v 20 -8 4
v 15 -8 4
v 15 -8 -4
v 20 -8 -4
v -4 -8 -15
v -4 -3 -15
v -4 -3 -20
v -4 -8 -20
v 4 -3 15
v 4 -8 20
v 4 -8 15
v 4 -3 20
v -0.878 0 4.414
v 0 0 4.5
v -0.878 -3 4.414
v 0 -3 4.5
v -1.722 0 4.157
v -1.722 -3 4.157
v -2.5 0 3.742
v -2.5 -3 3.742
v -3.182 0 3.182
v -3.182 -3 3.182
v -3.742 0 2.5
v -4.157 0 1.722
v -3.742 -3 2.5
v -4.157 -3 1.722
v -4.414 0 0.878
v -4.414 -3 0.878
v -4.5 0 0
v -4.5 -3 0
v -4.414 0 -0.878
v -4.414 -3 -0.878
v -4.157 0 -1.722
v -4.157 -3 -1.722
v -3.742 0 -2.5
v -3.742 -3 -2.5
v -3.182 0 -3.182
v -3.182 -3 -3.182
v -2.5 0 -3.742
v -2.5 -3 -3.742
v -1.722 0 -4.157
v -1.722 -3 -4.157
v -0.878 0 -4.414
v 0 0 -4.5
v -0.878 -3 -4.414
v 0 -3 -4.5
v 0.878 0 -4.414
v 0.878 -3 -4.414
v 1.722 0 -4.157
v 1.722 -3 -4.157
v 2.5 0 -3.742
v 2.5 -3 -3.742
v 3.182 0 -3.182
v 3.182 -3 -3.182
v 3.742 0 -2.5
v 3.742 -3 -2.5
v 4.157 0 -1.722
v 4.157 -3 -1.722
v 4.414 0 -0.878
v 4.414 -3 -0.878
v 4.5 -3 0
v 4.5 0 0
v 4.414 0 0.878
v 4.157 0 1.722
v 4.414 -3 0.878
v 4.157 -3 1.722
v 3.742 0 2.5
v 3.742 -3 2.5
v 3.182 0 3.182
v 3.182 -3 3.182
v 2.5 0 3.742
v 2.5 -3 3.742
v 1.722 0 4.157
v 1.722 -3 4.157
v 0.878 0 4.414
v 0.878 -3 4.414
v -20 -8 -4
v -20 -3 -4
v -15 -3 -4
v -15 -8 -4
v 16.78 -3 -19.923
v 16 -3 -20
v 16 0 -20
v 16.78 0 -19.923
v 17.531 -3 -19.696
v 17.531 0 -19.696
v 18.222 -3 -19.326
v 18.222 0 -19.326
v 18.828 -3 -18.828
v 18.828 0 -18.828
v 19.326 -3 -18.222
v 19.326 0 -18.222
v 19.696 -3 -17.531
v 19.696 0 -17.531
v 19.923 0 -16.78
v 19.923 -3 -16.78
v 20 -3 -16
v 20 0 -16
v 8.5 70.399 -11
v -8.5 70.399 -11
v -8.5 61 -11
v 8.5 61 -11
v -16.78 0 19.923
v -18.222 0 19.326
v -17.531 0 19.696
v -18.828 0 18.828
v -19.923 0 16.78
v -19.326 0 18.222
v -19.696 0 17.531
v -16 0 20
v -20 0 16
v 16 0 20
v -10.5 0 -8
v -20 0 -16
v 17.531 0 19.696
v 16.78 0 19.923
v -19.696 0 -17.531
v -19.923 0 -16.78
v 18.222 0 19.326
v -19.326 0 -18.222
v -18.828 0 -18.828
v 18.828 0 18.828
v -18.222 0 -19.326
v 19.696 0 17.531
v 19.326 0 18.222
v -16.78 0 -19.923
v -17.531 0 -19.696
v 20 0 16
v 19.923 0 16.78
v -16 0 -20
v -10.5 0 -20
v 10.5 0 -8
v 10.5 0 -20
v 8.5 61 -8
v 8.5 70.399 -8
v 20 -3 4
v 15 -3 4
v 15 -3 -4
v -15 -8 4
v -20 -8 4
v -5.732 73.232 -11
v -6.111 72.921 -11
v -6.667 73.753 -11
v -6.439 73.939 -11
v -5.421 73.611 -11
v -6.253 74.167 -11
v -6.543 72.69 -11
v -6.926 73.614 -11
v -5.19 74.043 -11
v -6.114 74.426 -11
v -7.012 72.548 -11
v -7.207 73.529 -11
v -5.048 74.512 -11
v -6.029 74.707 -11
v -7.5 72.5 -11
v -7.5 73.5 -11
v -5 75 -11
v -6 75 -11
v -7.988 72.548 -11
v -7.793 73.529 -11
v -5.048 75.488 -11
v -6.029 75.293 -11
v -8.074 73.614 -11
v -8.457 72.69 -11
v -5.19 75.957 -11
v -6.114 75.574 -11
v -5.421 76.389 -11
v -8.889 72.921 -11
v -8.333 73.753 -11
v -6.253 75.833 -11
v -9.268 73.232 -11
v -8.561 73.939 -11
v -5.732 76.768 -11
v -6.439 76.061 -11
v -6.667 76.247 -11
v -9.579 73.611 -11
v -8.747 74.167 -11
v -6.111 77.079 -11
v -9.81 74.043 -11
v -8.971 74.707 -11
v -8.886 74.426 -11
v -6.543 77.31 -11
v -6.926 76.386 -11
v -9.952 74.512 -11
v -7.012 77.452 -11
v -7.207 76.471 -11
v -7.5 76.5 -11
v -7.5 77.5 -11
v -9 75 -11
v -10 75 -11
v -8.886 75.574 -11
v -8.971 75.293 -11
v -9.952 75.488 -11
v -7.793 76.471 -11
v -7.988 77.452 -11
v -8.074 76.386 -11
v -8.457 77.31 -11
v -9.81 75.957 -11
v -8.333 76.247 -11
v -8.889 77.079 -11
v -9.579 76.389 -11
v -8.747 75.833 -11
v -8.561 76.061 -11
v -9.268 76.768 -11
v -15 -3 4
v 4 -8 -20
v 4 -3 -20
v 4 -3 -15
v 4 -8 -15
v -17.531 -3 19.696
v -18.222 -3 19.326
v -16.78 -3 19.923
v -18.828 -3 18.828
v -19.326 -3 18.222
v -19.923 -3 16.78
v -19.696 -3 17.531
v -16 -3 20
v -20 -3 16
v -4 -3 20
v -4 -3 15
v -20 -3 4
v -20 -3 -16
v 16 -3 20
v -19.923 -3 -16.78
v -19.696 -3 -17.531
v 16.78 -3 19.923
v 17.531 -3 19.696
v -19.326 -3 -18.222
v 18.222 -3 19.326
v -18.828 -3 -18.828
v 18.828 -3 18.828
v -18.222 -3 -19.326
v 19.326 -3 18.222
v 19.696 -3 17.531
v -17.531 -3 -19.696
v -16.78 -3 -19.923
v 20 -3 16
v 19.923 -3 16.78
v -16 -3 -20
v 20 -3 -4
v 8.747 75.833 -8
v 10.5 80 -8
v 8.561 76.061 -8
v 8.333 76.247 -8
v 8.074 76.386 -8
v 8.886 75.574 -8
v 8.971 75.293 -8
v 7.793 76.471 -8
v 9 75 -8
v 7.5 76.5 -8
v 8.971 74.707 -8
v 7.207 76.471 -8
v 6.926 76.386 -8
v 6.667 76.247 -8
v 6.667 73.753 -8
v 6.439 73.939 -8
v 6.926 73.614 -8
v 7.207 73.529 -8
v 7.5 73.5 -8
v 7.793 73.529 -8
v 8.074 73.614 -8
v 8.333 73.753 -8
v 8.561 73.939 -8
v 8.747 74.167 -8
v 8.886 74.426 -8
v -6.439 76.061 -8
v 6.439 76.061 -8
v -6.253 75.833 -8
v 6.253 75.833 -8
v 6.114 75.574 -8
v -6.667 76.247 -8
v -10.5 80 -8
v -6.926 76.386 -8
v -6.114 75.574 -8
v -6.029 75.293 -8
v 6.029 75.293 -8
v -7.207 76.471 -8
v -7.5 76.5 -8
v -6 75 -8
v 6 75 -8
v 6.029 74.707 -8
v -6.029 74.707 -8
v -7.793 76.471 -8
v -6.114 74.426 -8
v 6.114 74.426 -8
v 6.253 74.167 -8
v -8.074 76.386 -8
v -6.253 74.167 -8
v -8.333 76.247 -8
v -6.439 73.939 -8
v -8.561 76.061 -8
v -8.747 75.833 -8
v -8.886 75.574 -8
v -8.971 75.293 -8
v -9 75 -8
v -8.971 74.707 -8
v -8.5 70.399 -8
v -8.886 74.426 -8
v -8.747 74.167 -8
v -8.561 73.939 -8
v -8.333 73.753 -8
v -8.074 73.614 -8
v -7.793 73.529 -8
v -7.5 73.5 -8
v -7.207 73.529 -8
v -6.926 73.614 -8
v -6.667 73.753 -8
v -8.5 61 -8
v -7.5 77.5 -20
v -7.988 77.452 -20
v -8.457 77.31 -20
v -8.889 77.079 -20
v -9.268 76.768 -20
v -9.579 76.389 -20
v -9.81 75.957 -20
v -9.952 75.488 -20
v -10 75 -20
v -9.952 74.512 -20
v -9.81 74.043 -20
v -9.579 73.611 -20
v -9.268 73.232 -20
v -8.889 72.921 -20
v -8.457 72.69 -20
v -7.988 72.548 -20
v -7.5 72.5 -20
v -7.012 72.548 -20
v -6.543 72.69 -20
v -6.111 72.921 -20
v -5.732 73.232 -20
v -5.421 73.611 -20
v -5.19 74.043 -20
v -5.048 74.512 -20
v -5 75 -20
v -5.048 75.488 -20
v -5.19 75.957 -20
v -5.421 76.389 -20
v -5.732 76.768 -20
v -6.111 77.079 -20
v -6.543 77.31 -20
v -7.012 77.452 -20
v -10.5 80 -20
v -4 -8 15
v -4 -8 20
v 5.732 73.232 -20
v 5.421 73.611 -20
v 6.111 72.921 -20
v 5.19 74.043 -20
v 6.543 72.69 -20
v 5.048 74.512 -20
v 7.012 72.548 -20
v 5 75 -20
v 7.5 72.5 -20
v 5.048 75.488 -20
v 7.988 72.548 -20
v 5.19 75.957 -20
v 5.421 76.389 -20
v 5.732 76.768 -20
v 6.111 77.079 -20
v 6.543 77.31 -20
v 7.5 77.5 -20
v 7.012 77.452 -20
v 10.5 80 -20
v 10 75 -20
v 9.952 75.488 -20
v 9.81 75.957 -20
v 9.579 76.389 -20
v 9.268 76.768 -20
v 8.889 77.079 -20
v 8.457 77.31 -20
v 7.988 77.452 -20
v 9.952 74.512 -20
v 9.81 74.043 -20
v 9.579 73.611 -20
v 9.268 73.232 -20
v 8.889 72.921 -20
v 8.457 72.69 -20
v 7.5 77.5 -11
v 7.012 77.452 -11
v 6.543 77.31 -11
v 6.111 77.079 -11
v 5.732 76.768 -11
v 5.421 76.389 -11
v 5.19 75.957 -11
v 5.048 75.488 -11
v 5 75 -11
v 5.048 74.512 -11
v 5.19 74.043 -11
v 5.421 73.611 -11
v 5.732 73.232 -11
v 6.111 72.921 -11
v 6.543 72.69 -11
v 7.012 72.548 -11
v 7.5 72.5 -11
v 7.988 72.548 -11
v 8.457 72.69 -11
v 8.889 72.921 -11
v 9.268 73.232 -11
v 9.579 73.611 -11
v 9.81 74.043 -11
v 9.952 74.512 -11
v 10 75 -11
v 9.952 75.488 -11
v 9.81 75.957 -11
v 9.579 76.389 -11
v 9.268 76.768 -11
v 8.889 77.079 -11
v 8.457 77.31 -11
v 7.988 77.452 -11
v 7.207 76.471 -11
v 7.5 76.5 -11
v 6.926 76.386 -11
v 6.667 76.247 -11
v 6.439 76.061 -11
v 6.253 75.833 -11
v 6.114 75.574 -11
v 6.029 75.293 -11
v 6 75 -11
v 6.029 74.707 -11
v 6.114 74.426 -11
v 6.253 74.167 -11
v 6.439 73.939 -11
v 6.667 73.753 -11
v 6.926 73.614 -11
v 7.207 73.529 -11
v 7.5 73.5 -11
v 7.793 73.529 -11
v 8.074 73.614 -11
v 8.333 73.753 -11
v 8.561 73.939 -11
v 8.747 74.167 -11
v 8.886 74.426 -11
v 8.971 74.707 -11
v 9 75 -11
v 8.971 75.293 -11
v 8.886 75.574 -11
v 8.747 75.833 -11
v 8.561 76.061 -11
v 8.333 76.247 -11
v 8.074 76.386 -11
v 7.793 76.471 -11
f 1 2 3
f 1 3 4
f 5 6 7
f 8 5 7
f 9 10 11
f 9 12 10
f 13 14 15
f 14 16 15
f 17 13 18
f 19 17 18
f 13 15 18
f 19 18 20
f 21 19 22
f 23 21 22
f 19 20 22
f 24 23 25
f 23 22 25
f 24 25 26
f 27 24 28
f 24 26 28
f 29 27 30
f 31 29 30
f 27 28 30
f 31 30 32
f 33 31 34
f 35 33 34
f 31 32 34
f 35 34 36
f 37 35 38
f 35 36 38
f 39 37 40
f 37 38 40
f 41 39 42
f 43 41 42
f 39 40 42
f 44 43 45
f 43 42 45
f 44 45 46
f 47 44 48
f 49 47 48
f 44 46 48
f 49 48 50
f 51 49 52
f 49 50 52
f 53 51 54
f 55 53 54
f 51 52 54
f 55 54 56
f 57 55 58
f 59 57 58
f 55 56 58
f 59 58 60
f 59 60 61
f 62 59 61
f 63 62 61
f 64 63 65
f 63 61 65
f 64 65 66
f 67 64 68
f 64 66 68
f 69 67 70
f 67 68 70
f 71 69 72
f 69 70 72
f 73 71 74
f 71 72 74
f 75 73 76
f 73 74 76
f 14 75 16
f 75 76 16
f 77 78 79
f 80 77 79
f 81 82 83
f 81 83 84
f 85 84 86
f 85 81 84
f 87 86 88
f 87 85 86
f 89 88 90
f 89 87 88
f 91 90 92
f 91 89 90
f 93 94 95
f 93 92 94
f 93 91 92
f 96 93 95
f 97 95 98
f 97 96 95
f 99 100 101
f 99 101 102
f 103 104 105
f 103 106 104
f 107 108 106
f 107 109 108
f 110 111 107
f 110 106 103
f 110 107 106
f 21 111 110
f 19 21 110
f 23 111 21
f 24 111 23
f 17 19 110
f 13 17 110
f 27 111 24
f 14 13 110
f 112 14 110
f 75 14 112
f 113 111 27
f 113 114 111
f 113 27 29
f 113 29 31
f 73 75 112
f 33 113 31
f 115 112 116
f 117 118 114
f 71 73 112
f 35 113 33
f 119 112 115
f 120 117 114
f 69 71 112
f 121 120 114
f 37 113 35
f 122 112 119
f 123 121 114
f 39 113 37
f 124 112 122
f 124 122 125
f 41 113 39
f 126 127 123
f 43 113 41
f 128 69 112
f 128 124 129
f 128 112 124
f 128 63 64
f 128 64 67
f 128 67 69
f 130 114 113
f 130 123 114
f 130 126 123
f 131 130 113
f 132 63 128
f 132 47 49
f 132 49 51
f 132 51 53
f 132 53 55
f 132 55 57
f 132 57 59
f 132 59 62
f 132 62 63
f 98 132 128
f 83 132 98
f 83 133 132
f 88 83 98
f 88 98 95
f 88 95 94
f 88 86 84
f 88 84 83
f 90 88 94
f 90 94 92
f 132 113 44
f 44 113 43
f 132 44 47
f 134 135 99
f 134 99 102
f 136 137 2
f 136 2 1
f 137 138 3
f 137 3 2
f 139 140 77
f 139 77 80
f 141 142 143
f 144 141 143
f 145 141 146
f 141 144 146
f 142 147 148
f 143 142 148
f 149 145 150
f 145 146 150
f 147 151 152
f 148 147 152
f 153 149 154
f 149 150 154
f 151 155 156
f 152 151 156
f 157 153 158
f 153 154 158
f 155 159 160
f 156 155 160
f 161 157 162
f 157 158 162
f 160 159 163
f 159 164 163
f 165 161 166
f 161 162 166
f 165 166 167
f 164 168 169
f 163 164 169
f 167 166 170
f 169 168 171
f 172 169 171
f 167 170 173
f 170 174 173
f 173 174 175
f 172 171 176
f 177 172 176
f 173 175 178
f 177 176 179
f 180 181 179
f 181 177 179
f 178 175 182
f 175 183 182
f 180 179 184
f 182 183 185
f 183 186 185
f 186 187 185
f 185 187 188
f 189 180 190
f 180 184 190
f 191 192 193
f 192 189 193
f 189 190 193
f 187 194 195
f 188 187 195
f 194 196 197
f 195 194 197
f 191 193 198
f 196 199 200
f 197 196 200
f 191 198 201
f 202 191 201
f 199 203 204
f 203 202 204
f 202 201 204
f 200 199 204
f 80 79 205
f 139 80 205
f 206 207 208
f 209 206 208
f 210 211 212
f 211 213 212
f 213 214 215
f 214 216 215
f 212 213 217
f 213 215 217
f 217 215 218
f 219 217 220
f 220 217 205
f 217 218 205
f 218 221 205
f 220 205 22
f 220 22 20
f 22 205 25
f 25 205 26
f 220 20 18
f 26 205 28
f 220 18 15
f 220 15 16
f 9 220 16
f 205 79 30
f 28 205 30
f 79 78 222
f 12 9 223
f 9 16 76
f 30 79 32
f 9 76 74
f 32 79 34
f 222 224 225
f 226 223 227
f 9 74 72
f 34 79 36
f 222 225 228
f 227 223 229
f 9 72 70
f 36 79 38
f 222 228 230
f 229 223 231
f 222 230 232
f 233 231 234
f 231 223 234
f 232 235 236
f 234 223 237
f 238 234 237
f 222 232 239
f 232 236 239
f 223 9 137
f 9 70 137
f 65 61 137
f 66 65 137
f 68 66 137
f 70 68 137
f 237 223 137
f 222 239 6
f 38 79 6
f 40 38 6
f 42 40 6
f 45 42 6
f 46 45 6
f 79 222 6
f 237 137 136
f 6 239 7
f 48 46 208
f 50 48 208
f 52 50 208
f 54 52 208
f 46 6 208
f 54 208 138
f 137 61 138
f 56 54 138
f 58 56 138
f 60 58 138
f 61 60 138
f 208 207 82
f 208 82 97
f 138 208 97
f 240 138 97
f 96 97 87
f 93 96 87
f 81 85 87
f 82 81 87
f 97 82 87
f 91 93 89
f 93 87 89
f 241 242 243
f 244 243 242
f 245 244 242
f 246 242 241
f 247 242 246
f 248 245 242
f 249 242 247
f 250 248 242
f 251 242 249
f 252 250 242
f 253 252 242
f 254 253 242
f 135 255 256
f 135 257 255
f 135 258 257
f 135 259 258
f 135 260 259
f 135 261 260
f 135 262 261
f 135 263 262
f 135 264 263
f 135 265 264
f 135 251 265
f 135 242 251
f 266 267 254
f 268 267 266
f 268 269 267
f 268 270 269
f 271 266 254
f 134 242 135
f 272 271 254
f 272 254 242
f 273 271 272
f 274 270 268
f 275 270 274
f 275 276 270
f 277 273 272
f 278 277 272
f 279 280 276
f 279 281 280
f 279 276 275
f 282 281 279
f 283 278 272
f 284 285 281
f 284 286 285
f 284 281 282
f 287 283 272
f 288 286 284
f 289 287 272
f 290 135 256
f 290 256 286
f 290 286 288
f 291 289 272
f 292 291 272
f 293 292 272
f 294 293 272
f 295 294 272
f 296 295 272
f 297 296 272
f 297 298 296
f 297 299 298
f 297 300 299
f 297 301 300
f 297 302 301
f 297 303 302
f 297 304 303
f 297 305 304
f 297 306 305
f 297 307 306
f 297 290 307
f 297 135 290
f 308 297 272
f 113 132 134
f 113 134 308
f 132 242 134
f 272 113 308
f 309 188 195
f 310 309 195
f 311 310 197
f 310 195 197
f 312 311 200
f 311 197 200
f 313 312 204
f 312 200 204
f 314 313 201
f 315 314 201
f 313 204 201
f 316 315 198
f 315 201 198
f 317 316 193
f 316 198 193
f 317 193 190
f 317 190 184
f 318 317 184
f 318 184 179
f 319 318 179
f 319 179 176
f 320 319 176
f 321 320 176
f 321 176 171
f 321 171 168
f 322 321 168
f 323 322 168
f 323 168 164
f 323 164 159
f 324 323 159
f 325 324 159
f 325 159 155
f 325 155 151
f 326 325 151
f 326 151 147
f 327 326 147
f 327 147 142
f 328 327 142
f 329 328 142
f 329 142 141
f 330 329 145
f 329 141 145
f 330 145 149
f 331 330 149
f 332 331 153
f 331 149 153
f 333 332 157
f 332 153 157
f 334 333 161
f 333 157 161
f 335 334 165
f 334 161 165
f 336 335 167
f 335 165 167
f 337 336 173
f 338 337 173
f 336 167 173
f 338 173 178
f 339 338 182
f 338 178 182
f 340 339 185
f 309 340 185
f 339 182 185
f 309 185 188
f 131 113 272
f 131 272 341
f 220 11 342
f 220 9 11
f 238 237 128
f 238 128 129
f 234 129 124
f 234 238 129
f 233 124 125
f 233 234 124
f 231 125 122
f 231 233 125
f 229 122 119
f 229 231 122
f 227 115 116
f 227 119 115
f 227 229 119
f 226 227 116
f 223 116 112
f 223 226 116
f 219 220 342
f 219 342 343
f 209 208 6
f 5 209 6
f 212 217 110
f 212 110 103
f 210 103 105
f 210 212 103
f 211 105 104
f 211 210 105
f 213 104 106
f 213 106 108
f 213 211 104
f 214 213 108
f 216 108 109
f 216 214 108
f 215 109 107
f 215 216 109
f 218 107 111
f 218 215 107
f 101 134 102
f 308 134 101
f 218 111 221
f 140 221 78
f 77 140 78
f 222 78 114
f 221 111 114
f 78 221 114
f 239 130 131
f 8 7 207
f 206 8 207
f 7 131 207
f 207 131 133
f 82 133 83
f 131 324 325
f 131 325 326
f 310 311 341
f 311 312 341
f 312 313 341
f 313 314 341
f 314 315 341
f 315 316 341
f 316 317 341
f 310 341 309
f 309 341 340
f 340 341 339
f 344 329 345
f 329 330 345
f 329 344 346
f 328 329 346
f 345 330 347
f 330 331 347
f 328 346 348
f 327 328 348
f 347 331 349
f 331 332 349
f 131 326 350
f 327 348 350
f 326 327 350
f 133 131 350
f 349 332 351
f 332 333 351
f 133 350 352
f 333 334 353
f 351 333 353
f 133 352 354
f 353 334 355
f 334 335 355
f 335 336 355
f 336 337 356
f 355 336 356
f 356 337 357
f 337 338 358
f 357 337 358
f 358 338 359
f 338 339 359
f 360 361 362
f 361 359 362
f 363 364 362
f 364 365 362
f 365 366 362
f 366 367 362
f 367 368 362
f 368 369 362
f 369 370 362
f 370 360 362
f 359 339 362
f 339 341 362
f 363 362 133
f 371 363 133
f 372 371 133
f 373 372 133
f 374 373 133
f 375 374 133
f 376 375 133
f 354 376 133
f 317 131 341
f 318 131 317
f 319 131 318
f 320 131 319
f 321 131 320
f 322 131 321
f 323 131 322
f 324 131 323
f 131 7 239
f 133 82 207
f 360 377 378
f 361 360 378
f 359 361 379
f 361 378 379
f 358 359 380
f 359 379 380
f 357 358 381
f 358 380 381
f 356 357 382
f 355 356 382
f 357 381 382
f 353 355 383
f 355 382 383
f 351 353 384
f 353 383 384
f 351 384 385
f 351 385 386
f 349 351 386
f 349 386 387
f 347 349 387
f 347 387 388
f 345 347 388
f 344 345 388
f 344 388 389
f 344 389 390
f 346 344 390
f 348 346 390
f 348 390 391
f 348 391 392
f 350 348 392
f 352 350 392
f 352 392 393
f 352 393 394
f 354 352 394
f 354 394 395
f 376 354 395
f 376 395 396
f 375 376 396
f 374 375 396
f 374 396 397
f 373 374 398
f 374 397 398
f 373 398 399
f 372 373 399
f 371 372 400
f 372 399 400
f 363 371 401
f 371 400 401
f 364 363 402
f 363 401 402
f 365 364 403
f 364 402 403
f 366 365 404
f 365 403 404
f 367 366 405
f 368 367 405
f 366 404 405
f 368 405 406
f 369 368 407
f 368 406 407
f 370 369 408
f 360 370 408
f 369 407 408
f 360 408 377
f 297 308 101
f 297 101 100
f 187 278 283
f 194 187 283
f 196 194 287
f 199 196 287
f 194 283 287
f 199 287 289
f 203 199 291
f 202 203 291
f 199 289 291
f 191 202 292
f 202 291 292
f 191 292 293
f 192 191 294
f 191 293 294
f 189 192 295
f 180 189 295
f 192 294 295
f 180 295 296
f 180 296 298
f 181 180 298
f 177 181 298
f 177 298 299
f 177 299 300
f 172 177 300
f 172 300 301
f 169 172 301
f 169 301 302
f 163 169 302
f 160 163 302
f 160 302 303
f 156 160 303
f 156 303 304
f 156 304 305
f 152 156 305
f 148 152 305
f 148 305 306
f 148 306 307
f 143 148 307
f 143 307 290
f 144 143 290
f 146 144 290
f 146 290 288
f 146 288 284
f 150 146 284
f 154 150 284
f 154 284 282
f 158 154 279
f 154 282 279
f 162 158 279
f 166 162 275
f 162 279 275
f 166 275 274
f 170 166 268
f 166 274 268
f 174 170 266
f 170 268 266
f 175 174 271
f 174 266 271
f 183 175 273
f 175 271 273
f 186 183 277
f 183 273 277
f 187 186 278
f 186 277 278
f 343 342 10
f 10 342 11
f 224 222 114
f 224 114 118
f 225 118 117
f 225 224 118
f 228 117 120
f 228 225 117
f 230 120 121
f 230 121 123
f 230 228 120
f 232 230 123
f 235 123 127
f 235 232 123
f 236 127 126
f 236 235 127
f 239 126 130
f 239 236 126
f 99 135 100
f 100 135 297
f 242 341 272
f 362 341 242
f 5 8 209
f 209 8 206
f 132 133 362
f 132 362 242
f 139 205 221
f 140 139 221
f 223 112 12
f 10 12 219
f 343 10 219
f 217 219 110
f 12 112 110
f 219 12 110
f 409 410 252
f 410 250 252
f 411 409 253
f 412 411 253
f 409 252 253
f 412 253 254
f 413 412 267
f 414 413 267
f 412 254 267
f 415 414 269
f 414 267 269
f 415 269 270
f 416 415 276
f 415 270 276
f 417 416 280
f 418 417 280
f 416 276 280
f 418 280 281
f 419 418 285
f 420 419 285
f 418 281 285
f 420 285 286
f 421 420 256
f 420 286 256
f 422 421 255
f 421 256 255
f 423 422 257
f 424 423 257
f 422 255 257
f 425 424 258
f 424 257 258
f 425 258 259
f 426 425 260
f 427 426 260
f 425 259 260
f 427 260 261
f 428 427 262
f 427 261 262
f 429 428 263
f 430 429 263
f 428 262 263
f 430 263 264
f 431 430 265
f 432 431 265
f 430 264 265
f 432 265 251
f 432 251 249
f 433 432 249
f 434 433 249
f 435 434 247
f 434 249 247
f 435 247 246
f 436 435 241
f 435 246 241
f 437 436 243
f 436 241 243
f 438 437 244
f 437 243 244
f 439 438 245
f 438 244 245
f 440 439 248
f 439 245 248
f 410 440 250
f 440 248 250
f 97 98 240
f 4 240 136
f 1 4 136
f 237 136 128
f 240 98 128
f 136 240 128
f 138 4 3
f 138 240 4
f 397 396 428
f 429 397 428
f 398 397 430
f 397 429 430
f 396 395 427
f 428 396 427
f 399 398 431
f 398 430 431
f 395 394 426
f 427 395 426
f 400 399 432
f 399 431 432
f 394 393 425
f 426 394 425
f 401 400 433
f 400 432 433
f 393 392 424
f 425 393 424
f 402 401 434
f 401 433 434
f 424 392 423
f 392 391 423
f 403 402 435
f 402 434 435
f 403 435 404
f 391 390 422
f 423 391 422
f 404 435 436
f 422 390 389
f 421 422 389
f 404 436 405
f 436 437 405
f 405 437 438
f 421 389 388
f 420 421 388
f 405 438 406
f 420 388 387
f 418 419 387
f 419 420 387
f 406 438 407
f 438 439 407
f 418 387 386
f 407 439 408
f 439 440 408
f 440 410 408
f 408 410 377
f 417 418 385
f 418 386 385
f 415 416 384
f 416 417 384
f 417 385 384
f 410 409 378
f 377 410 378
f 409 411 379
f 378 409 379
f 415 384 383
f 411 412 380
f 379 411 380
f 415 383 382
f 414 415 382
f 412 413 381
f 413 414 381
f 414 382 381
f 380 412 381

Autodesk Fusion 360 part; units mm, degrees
sketch "Sketch1" plane through (0, 0, 0) normal (0, 1, 0) x (1, 0, 0)
  line L0 (20, -20) -> (-20, -20)
  line L1 (-20, -20) -> (-20, 20)
  line L2 (-20, 20) -> (20, 20)
  line L3 (20, 20) -> (20, -20)
  line L4 (20, -20) -> (-20, 20) construction
  line L5 (-20, -20) -> (20, 20) construction
  line L6 (-20, 4) -> (-15, 4)
  line L7 (-15, 4) -> (-15, -4)
  line L8 (-15, -4) -> (-20, -4)
  line L9 (-20, -4) -> (-20, 4)
  line L10 (-4, 20) -> (4, 20)
  line L11 (4, 20) -> (4, 15)
  line L12 (4, 15) -> (-4, 15)
  line L13 (-4, 15) -> (-4, 20)
  line L14 (20, 4) -> (15, 4)
  line L15 (15, 4) -> (15, -4)
  line L16 (15, -4) -> (20, -4)
  line L17 (20, -4) -> (20, 4)
  line L18 (-4, -20) -> (4, -20)
  line L19 (4, -20) -> (4, -15)
  line L20 (4, -15) -> (-4, -15)
  line L21 (-4, -15) -> (-4, -20)
  dimension "d1" = 40
  dimension "d2" = 40
  dimension "d3" = 5
  dimension "d4" = 8
  dimension "d5" = 16
  dimension "d6" = 5
  dimension "d7" = 16
  dimension "d8" = 8
  dimension "d9" = 5
  dimension "d10" = 5
  dimension "d11" = 8
  dimension "d12" = 8
  dimension "d13" = 16
  dimension "d14" = 16
extrude "Extrude1" add sketch "Sketch1" against normal blind 3 contours L0 L1 L2 L3 L6 L7 L8 L11 L12 L13 L14 L15 L16 L19 L20 L21
extrude "Extrude2" add sketch "Sketch1" against normal blind 8 contours L0 L18 L19 L20 L21 | L3 L14 L15 L16 L17 | L1 L6 L7 L8 L9 | L2 L10 L11 L12 L13
hole "Hole1" at (0, 0, 0) direction (0, -1, 0) diameter 9 depth 30 tip angle 118
fillet "Fillet1" radius 4 4 edges at (20, -1.5, -20) (-20, -1.5, -20) (20, -1.5, 20) (-20, -1.5, 20)
sketch "Sketch2" plane through (0, 0, 0) normal (0, 0, 1) x (1, 0, 0)
sketch "Sketch3" plane through (0, 0, 0) normal (0, 1, 0) x (1, 0, 0)
  line L0 (-10.5, 20) -> (10.5, 20)
  line L1 (10.5, 20) -> (10.5, 8)
  line L2 (10.5, 8) -> (-10.5, 8)
  line L3 (-10.5, 8) -> (-10.5, 20)
  line L4 (-20, -20) -> (-20, 20)
  dimension "d26" = 21
  dimension "d27" = 9.5
  dimension "d28" = 12
extrude "Extrude3" add sketch "Sketch3" along normal blind 80
sketch "Sketch4" plane through (0, 0, -8) normal (0, 0, 1) x (1, 0, 0)
  line L0 (-10.5, 0) -> (10.5, 0)
  line L1 (10.5, 0) -> (10.5, 80)
  line L2 (10.5, 80) -> (-10.5, 80)
  line L3 (-10.5, 80) -> (-10.5, 0)
  line L4 (-10.5, 80) -> (10.5, 80)
  line L5 (10.5, 80) -> (10.5, 59)
  line L6 (10.5, 59) -> (-10.5, 59)
  line L7 (-10.5, 59) -> (-10.5, 80)
  line L8 (8.5, 78) -> (8.5, 61)
  line L9 (8.5, 61) -> (-8.5, 61)
  line L10 (-8.5, 61) -> (-8.5, 78)
  line L11 (-8.5, 78) -> (8.5, 78)
  line L12 (-8.5, 78) -> (8.5, 78)
  line L13 (8.5, 78) -> (8.5, 64.8708)
  line L14 (-8.5, 64.8708) -> (-8.5, 78)
  line L15 (-8.5, 61) -> (8.5, 61)
  line L16 (8.5, 61) -> (8.5, 70.3993)
  line L17 (8.5, 70.3993) -> (-8.5, 70.3993)
  line L18 (-8.5, 70.3993) -> (-8.5, 61)
  point P0 (-7.5, 64)
  point P1 (7.5, 64)
  dimension "d29" = 21
  dimension "d30" = 21
  dimension "d31" = 2
  dimension "d34" = 5
  dimension "d35" = 15
  dimension "d36" = 3
extrude "Extrude5" cut sketch "Sketch4" against normal blind 3 contours L8 L9 L10 L13 L14 L15 L16 L17 L18
sketch "Sketch6" plane through (0, 0, -20) normal (0, 0, -1) x (-1, 0, 0)
  line L0 (16, -3) -> (16, 0)
  line L1 (16, 0) -> (10.5, 0)
  line L2 (10.5, 0) -> (10.5, 80)
  line L3 (10.5, 80) -> (-10.5, 80)
  line L4 (-10.5, 80) -> (-10.5, 0)
  line L5 (-10.5, 0) -> (-16, 0)
  line L6 (-16, 0) -> (-16, -3)
  line L7 (-16, -3) -> (-4, -3)
  line L8 (-4, -3) -> (-4, -8)
  line L9 (-4, -8) -> (4, -8)
  line L10 (4, -8) -> (4, -3)
  line L11 (4, -3) -> (16, -3)
  point P0 (-7.5, 75)
  point P1 (7.5, 75)
  dimension "d45" = 15
  dimension "d46" = 3
  dimension "d47" = 5
hole "Hole4" at (7.5, 75, -20) at (-7.5, 75, -20) direction (0, 0, 1) diameter 3 depth 12 tip angle 118 counterbore diameter 5 counterbore depth 9
equation "d6 = d3"
equation "d7 = d5"
equation "d8 = d4"
equation "d9 = d3"
equation "d10 = d3"
equation "d11 = d4"
equation "d12 = d4"
equation "d13 = d7"
equation "d14 = d7"
